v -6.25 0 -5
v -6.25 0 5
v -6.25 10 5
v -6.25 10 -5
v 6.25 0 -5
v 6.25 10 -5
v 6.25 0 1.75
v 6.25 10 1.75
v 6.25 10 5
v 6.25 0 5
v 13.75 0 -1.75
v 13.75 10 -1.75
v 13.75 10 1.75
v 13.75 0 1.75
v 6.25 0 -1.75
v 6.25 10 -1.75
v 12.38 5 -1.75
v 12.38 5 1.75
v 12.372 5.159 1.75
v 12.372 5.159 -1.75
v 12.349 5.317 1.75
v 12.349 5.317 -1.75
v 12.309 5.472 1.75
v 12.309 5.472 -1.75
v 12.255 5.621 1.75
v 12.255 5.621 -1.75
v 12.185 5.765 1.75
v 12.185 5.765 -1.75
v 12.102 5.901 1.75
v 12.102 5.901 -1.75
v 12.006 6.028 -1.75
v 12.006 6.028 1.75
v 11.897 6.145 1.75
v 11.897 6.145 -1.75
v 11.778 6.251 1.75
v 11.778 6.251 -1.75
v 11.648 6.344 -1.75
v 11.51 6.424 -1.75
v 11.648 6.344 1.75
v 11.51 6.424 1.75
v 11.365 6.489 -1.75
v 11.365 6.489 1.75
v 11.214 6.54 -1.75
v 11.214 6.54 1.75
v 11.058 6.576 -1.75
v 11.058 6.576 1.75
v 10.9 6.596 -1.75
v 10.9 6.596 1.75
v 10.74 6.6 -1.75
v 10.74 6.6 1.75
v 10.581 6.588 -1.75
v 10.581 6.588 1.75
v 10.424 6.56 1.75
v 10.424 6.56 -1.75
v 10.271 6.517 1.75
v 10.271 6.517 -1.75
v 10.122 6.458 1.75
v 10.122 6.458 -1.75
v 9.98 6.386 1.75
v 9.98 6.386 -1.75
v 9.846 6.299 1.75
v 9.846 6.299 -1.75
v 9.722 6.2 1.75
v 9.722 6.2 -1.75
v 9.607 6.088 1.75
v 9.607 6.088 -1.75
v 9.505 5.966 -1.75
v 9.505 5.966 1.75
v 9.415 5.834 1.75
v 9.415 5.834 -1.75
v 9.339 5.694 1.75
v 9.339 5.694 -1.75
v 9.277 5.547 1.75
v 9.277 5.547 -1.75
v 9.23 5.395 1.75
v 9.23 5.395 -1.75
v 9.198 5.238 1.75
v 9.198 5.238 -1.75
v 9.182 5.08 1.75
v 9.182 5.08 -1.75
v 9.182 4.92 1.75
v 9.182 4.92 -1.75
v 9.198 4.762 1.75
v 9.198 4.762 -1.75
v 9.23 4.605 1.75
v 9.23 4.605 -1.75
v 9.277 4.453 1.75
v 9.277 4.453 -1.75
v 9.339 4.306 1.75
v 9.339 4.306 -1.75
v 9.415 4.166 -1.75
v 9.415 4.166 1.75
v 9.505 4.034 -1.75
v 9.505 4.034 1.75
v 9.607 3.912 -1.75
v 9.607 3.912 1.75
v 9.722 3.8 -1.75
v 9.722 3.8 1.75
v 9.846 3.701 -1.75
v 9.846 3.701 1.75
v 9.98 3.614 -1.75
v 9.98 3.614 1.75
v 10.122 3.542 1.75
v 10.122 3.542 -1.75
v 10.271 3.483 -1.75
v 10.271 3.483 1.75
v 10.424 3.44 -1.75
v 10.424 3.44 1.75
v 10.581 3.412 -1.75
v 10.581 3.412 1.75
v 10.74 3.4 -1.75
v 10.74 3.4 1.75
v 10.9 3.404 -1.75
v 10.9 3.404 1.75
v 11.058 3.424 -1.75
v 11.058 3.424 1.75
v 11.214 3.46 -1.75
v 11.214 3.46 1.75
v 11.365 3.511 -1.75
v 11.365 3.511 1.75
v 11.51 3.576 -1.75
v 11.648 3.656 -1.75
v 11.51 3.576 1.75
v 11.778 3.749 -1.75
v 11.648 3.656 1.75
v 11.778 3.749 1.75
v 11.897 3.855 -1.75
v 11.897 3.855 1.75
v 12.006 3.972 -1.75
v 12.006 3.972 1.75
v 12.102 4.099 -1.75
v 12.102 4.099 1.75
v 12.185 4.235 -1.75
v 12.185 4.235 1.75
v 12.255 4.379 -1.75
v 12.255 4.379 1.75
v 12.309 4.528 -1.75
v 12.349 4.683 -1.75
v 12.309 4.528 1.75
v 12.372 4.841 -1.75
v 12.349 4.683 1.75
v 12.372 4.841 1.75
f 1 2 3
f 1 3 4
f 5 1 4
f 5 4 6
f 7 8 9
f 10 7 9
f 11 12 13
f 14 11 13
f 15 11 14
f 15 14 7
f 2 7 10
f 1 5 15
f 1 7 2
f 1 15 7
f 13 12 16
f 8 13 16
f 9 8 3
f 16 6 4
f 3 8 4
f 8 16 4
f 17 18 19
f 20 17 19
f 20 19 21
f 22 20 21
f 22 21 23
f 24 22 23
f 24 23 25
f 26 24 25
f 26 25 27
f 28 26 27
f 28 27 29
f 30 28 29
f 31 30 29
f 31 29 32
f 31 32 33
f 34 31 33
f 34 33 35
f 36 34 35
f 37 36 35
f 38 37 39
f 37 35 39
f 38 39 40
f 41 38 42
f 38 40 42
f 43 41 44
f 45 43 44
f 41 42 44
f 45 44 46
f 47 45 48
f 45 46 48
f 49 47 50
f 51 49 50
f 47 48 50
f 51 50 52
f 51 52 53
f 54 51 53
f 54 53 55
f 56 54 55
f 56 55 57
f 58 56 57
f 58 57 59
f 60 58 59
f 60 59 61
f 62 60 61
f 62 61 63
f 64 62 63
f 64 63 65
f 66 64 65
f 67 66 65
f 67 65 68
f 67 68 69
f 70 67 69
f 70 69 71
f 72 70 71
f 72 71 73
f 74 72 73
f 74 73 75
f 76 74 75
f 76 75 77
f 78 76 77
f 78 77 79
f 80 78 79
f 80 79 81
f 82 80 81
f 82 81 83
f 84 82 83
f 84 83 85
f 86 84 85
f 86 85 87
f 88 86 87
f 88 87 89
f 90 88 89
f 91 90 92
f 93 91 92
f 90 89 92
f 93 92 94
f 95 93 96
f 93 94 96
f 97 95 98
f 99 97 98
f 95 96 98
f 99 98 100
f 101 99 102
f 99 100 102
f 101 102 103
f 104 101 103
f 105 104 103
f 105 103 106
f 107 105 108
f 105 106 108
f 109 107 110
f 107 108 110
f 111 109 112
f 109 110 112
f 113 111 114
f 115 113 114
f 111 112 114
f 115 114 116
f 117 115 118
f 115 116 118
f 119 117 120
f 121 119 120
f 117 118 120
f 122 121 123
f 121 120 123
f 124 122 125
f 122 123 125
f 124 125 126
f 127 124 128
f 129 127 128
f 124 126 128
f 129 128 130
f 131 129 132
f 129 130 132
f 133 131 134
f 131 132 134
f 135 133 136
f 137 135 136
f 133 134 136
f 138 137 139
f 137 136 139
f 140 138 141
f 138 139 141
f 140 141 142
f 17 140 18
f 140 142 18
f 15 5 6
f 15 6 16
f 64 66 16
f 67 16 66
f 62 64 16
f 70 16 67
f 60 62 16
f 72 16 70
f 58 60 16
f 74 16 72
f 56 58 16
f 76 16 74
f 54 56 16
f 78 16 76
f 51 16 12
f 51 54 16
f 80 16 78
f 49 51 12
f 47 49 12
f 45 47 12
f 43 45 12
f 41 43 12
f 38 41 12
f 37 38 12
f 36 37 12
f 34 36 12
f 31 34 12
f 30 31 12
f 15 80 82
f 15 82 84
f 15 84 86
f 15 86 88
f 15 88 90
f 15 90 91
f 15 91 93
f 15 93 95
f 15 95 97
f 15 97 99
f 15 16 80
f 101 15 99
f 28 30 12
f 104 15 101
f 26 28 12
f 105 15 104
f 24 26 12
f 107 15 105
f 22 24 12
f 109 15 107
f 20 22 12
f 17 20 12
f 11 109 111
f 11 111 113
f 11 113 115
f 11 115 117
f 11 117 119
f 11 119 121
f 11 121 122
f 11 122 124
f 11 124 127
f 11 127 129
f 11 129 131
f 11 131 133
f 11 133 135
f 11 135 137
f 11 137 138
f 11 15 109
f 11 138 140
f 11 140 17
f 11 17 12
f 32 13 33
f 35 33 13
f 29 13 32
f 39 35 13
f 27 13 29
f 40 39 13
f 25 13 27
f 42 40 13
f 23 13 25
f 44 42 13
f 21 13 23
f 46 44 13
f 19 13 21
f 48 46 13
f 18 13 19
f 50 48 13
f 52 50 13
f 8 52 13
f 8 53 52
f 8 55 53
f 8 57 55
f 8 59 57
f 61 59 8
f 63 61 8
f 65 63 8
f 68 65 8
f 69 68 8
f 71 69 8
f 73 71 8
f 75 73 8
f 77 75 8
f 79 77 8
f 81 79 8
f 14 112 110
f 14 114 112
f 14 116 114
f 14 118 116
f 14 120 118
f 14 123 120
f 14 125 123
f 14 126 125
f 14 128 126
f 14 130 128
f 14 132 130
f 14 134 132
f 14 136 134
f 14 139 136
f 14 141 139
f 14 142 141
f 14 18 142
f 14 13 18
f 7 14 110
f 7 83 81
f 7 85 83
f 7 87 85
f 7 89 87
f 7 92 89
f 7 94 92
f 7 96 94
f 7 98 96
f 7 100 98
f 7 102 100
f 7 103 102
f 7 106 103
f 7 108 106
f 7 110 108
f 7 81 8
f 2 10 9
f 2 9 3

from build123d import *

# Parameters (mm, degrees)
BOSS_EXTRUDE1_DEPTH = 10
SKETCH4_R           = 1.6
CUT_EXTRUDE2_DEPTH  = 7.75


with BuildPart() as part:
    # Sketch1 → Boss-Extrude1 (new body)
    with BuildSketch(Plane(origin=(0, 0, 0), x_dir=(1, 0, 0), z_dir=(0, 1, 0))):
        Polygon((6.25, 5), (6.25, 1.75), (13.75, 1.75), (13.75, -1.75), (6.25, -1.75), (6.25, -5), (-6.25, -5), (-6.25, 5), align=None)
    extrude(amount=BOSS_EXTRUDE1_DEPTH)

    # Sketch4 → Cut-Extrude2 (cut, through all)
    with BuildSketch(Plane.XY.offset(1.75)):
        with Locations((10.780263086, 5)):
            Circle(SKETCH4_R)
    extrude(amount=-CUT_EXTRUDE2_DEPTH, mode=Mode.SUBTRACT)


solid = part.part
